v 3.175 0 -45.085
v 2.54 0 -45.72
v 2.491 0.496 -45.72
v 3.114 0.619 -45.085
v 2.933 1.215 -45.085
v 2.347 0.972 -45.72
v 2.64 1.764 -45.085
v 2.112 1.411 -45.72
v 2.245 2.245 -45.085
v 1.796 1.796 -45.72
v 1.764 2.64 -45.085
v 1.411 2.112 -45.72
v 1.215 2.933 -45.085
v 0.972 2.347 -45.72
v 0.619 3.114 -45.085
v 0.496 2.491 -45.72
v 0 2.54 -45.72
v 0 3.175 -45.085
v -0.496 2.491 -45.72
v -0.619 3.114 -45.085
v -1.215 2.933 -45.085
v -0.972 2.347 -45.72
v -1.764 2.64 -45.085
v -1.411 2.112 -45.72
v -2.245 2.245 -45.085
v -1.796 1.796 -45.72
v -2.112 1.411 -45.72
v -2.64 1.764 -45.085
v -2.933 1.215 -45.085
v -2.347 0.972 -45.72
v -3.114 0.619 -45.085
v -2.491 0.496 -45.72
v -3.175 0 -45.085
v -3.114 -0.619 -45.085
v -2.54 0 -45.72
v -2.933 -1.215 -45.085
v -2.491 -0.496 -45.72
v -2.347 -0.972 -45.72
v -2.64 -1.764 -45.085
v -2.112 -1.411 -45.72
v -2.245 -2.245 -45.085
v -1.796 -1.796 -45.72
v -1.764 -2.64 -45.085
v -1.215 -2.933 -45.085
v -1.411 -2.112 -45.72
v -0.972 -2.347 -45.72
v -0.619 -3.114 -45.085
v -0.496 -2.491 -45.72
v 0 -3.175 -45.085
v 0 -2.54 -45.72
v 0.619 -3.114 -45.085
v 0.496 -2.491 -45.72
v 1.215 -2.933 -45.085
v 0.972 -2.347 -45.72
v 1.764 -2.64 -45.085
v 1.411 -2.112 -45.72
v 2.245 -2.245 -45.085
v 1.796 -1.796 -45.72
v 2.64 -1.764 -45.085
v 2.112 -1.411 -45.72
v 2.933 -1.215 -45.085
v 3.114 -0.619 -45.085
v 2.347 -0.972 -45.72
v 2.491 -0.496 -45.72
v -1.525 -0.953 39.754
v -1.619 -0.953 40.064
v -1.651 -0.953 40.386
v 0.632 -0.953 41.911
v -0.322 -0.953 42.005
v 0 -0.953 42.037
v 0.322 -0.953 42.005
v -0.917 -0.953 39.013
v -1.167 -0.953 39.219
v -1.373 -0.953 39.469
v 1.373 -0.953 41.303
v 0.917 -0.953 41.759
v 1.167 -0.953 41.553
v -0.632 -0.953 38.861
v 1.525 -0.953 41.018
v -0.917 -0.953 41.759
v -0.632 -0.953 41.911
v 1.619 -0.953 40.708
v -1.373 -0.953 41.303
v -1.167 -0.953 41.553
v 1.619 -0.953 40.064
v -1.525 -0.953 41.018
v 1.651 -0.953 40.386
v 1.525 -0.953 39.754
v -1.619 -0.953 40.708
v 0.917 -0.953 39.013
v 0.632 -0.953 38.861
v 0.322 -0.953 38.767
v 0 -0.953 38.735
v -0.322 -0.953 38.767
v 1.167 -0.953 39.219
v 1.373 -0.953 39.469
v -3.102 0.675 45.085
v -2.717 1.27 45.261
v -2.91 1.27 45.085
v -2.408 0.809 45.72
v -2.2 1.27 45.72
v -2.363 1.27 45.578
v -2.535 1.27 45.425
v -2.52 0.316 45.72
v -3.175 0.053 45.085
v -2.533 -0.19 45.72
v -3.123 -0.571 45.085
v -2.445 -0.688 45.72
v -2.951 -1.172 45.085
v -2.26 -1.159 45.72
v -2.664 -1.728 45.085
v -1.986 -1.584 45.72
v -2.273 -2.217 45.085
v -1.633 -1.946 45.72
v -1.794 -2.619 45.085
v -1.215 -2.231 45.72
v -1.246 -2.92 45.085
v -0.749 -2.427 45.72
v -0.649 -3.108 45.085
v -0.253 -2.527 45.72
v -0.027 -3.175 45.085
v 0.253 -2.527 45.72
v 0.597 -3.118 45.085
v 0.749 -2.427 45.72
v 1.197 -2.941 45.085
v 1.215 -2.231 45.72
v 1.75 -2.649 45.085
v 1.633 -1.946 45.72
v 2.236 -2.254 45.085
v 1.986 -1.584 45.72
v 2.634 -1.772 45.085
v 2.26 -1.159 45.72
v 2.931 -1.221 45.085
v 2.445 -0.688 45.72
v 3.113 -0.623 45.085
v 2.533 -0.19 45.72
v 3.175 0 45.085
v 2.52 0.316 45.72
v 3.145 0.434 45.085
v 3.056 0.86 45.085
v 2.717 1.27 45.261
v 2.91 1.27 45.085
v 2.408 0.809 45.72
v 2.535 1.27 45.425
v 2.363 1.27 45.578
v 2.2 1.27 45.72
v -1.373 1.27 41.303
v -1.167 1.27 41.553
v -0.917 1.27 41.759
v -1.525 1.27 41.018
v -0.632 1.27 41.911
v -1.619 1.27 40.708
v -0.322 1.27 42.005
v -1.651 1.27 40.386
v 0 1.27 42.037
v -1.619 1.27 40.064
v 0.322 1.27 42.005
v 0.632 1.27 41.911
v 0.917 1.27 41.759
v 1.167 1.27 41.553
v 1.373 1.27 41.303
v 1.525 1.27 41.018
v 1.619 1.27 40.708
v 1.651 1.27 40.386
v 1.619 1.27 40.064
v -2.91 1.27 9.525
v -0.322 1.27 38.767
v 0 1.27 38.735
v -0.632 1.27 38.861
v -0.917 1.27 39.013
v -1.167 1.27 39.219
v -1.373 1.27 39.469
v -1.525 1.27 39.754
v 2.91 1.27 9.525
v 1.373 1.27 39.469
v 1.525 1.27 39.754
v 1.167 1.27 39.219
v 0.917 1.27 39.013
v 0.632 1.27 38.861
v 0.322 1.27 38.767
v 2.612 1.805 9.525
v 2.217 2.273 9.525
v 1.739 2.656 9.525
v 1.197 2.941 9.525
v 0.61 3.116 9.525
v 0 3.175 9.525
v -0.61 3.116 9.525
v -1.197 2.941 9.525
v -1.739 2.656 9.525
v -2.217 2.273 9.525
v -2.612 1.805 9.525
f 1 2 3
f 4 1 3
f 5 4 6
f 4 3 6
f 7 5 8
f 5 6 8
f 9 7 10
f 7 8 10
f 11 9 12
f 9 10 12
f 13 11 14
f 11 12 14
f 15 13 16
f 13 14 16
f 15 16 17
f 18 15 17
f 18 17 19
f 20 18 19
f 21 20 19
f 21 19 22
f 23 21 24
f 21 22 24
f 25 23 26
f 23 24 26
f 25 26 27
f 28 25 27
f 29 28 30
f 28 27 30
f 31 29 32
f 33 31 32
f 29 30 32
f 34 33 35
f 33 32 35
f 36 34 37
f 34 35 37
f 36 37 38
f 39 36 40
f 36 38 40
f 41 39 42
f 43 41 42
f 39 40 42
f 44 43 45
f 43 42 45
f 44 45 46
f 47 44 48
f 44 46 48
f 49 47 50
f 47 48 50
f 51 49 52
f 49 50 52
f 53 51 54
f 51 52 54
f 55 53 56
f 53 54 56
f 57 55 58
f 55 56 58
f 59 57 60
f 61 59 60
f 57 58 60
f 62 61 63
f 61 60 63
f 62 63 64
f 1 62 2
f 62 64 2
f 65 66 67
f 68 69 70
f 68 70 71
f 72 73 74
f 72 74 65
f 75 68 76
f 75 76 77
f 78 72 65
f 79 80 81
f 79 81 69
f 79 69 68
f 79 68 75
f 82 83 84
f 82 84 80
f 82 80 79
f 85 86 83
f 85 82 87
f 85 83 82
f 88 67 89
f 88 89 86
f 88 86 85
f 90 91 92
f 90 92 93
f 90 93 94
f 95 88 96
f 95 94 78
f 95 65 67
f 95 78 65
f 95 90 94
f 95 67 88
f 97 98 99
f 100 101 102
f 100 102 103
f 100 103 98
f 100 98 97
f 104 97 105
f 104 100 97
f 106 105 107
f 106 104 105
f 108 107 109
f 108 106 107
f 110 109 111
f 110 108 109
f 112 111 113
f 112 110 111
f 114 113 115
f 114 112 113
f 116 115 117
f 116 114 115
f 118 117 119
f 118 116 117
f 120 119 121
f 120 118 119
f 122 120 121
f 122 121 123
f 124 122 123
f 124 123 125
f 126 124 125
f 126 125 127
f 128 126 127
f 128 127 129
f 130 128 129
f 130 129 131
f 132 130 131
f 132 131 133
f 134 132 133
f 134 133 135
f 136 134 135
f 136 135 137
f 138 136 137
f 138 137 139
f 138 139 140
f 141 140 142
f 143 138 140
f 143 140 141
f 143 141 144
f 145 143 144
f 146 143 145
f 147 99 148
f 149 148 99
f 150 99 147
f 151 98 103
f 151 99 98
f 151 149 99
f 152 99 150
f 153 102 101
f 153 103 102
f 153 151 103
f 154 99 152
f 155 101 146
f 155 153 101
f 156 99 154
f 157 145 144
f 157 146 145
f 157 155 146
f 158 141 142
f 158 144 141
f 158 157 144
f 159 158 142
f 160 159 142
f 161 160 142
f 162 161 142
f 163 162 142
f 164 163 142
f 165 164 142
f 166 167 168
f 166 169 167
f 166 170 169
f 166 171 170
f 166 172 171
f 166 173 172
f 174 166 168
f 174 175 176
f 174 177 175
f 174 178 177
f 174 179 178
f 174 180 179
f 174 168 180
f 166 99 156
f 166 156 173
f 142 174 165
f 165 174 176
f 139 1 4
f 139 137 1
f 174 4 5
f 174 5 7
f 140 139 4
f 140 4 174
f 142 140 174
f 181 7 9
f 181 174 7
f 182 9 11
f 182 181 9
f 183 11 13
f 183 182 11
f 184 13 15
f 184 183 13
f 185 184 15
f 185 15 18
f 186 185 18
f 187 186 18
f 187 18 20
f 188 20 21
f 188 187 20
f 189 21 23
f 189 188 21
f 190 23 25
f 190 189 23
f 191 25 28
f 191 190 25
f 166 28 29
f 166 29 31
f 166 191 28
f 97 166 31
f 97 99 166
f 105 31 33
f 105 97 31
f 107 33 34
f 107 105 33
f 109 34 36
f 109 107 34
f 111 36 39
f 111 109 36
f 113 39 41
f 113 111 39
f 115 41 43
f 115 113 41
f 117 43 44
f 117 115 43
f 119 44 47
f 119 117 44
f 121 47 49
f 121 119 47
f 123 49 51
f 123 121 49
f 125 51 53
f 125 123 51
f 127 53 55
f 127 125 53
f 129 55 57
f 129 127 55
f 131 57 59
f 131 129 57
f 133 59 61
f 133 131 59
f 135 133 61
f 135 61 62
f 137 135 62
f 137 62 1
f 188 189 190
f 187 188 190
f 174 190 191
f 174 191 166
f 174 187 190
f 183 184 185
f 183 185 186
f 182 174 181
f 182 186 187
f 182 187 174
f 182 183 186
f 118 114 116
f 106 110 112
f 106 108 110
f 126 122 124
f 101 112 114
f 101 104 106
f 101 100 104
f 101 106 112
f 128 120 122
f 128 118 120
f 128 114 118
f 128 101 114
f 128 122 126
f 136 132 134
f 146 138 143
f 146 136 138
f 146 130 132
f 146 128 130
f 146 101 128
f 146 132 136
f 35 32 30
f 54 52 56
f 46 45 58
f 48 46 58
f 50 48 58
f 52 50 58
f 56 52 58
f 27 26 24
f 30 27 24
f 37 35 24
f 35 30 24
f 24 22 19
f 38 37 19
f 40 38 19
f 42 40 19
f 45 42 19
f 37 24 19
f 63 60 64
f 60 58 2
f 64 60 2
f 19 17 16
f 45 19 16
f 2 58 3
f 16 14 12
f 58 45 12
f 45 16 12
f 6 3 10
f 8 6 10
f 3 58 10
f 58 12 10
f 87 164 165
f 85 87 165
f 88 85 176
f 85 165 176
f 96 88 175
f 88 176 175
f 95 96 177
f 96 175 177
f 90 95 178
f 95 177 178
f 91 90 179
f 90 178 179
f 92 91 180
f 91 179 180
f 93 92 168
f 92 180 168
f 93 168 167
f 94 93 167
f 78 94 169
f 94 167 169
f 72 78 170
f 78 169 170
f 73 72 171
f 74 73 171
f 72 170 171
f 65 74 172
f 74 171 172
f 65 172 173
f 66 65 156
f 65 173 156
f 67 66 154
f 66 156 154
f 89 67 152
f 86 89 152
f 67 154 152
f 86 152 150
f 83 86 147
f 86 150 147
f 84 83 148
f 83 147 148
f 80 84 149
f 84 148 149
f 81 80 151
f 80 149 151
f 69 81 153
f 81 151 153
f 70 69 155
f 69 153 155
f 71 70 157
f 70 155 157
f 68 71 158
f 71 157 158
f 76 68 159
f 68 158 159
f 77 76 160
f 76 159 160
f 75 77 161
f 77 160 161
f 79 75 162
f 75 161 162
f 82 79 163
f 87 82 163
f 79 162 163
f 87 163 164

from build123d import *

# Parameters (mm, degrees)
SKETCH1_R          = 3.175
EXTRUDE1_DEPTH     = 45.72
CHAMFER1_SIZE      = 0.635
EXTRUDE7_DEPTH     = 37.195
SKETCH14_R         = 1.651
CUT_EXTRUDE1_DEPTH = 2.2225


with BuildPart() as part:
    # Sketch1 → Extrude1 (new body, symmetric)
    with BuildSketch(Plane.XY):
        Circle(SKETCH1_R)
    extrude(amount=EXTRUDE1_DEPTH, both=True)

    # Chamfer1
    chamfer1_edges = [part.edges().sort_by_distance(p)[0] for p in [
        (-3.175, 0, -45.72),
        (-3.175, 0, 45.72),
    ]]
    chamfer(chamfer1_edges, length=CHAMFER1_SIZE)

    # Sketch13 → Extrude7 (cut, through all)
    with BuildSketch(Plane.XY.offset(9.525)):
        with BuildLine():
            Line((-2.909935566, 1.27), (2.909935566, 1.27))
            ThreePointArc((2.909935566, 1.27), (0, 3.175), (-2.909935566, 1.27))
        make_face()
    extrude(amount=EXTRUDE7_DEPTH, mode=Mode.SUBTRACT)

    # Sketch14 → Cut-Extrude1 (cut)
    with BuildSketch(Plane(origin=(0, 1.27, 0), x_dir=(1, 0, 0), z_dir=(0, 1, 0))):
        with Locations((0, -40.386)):
            Circle(SKETCH14_R)
    extrude(amount=-CUT_EXTRUDE1_DEPTH, mode=Mode.SUBTRACT)


solid = part.part
